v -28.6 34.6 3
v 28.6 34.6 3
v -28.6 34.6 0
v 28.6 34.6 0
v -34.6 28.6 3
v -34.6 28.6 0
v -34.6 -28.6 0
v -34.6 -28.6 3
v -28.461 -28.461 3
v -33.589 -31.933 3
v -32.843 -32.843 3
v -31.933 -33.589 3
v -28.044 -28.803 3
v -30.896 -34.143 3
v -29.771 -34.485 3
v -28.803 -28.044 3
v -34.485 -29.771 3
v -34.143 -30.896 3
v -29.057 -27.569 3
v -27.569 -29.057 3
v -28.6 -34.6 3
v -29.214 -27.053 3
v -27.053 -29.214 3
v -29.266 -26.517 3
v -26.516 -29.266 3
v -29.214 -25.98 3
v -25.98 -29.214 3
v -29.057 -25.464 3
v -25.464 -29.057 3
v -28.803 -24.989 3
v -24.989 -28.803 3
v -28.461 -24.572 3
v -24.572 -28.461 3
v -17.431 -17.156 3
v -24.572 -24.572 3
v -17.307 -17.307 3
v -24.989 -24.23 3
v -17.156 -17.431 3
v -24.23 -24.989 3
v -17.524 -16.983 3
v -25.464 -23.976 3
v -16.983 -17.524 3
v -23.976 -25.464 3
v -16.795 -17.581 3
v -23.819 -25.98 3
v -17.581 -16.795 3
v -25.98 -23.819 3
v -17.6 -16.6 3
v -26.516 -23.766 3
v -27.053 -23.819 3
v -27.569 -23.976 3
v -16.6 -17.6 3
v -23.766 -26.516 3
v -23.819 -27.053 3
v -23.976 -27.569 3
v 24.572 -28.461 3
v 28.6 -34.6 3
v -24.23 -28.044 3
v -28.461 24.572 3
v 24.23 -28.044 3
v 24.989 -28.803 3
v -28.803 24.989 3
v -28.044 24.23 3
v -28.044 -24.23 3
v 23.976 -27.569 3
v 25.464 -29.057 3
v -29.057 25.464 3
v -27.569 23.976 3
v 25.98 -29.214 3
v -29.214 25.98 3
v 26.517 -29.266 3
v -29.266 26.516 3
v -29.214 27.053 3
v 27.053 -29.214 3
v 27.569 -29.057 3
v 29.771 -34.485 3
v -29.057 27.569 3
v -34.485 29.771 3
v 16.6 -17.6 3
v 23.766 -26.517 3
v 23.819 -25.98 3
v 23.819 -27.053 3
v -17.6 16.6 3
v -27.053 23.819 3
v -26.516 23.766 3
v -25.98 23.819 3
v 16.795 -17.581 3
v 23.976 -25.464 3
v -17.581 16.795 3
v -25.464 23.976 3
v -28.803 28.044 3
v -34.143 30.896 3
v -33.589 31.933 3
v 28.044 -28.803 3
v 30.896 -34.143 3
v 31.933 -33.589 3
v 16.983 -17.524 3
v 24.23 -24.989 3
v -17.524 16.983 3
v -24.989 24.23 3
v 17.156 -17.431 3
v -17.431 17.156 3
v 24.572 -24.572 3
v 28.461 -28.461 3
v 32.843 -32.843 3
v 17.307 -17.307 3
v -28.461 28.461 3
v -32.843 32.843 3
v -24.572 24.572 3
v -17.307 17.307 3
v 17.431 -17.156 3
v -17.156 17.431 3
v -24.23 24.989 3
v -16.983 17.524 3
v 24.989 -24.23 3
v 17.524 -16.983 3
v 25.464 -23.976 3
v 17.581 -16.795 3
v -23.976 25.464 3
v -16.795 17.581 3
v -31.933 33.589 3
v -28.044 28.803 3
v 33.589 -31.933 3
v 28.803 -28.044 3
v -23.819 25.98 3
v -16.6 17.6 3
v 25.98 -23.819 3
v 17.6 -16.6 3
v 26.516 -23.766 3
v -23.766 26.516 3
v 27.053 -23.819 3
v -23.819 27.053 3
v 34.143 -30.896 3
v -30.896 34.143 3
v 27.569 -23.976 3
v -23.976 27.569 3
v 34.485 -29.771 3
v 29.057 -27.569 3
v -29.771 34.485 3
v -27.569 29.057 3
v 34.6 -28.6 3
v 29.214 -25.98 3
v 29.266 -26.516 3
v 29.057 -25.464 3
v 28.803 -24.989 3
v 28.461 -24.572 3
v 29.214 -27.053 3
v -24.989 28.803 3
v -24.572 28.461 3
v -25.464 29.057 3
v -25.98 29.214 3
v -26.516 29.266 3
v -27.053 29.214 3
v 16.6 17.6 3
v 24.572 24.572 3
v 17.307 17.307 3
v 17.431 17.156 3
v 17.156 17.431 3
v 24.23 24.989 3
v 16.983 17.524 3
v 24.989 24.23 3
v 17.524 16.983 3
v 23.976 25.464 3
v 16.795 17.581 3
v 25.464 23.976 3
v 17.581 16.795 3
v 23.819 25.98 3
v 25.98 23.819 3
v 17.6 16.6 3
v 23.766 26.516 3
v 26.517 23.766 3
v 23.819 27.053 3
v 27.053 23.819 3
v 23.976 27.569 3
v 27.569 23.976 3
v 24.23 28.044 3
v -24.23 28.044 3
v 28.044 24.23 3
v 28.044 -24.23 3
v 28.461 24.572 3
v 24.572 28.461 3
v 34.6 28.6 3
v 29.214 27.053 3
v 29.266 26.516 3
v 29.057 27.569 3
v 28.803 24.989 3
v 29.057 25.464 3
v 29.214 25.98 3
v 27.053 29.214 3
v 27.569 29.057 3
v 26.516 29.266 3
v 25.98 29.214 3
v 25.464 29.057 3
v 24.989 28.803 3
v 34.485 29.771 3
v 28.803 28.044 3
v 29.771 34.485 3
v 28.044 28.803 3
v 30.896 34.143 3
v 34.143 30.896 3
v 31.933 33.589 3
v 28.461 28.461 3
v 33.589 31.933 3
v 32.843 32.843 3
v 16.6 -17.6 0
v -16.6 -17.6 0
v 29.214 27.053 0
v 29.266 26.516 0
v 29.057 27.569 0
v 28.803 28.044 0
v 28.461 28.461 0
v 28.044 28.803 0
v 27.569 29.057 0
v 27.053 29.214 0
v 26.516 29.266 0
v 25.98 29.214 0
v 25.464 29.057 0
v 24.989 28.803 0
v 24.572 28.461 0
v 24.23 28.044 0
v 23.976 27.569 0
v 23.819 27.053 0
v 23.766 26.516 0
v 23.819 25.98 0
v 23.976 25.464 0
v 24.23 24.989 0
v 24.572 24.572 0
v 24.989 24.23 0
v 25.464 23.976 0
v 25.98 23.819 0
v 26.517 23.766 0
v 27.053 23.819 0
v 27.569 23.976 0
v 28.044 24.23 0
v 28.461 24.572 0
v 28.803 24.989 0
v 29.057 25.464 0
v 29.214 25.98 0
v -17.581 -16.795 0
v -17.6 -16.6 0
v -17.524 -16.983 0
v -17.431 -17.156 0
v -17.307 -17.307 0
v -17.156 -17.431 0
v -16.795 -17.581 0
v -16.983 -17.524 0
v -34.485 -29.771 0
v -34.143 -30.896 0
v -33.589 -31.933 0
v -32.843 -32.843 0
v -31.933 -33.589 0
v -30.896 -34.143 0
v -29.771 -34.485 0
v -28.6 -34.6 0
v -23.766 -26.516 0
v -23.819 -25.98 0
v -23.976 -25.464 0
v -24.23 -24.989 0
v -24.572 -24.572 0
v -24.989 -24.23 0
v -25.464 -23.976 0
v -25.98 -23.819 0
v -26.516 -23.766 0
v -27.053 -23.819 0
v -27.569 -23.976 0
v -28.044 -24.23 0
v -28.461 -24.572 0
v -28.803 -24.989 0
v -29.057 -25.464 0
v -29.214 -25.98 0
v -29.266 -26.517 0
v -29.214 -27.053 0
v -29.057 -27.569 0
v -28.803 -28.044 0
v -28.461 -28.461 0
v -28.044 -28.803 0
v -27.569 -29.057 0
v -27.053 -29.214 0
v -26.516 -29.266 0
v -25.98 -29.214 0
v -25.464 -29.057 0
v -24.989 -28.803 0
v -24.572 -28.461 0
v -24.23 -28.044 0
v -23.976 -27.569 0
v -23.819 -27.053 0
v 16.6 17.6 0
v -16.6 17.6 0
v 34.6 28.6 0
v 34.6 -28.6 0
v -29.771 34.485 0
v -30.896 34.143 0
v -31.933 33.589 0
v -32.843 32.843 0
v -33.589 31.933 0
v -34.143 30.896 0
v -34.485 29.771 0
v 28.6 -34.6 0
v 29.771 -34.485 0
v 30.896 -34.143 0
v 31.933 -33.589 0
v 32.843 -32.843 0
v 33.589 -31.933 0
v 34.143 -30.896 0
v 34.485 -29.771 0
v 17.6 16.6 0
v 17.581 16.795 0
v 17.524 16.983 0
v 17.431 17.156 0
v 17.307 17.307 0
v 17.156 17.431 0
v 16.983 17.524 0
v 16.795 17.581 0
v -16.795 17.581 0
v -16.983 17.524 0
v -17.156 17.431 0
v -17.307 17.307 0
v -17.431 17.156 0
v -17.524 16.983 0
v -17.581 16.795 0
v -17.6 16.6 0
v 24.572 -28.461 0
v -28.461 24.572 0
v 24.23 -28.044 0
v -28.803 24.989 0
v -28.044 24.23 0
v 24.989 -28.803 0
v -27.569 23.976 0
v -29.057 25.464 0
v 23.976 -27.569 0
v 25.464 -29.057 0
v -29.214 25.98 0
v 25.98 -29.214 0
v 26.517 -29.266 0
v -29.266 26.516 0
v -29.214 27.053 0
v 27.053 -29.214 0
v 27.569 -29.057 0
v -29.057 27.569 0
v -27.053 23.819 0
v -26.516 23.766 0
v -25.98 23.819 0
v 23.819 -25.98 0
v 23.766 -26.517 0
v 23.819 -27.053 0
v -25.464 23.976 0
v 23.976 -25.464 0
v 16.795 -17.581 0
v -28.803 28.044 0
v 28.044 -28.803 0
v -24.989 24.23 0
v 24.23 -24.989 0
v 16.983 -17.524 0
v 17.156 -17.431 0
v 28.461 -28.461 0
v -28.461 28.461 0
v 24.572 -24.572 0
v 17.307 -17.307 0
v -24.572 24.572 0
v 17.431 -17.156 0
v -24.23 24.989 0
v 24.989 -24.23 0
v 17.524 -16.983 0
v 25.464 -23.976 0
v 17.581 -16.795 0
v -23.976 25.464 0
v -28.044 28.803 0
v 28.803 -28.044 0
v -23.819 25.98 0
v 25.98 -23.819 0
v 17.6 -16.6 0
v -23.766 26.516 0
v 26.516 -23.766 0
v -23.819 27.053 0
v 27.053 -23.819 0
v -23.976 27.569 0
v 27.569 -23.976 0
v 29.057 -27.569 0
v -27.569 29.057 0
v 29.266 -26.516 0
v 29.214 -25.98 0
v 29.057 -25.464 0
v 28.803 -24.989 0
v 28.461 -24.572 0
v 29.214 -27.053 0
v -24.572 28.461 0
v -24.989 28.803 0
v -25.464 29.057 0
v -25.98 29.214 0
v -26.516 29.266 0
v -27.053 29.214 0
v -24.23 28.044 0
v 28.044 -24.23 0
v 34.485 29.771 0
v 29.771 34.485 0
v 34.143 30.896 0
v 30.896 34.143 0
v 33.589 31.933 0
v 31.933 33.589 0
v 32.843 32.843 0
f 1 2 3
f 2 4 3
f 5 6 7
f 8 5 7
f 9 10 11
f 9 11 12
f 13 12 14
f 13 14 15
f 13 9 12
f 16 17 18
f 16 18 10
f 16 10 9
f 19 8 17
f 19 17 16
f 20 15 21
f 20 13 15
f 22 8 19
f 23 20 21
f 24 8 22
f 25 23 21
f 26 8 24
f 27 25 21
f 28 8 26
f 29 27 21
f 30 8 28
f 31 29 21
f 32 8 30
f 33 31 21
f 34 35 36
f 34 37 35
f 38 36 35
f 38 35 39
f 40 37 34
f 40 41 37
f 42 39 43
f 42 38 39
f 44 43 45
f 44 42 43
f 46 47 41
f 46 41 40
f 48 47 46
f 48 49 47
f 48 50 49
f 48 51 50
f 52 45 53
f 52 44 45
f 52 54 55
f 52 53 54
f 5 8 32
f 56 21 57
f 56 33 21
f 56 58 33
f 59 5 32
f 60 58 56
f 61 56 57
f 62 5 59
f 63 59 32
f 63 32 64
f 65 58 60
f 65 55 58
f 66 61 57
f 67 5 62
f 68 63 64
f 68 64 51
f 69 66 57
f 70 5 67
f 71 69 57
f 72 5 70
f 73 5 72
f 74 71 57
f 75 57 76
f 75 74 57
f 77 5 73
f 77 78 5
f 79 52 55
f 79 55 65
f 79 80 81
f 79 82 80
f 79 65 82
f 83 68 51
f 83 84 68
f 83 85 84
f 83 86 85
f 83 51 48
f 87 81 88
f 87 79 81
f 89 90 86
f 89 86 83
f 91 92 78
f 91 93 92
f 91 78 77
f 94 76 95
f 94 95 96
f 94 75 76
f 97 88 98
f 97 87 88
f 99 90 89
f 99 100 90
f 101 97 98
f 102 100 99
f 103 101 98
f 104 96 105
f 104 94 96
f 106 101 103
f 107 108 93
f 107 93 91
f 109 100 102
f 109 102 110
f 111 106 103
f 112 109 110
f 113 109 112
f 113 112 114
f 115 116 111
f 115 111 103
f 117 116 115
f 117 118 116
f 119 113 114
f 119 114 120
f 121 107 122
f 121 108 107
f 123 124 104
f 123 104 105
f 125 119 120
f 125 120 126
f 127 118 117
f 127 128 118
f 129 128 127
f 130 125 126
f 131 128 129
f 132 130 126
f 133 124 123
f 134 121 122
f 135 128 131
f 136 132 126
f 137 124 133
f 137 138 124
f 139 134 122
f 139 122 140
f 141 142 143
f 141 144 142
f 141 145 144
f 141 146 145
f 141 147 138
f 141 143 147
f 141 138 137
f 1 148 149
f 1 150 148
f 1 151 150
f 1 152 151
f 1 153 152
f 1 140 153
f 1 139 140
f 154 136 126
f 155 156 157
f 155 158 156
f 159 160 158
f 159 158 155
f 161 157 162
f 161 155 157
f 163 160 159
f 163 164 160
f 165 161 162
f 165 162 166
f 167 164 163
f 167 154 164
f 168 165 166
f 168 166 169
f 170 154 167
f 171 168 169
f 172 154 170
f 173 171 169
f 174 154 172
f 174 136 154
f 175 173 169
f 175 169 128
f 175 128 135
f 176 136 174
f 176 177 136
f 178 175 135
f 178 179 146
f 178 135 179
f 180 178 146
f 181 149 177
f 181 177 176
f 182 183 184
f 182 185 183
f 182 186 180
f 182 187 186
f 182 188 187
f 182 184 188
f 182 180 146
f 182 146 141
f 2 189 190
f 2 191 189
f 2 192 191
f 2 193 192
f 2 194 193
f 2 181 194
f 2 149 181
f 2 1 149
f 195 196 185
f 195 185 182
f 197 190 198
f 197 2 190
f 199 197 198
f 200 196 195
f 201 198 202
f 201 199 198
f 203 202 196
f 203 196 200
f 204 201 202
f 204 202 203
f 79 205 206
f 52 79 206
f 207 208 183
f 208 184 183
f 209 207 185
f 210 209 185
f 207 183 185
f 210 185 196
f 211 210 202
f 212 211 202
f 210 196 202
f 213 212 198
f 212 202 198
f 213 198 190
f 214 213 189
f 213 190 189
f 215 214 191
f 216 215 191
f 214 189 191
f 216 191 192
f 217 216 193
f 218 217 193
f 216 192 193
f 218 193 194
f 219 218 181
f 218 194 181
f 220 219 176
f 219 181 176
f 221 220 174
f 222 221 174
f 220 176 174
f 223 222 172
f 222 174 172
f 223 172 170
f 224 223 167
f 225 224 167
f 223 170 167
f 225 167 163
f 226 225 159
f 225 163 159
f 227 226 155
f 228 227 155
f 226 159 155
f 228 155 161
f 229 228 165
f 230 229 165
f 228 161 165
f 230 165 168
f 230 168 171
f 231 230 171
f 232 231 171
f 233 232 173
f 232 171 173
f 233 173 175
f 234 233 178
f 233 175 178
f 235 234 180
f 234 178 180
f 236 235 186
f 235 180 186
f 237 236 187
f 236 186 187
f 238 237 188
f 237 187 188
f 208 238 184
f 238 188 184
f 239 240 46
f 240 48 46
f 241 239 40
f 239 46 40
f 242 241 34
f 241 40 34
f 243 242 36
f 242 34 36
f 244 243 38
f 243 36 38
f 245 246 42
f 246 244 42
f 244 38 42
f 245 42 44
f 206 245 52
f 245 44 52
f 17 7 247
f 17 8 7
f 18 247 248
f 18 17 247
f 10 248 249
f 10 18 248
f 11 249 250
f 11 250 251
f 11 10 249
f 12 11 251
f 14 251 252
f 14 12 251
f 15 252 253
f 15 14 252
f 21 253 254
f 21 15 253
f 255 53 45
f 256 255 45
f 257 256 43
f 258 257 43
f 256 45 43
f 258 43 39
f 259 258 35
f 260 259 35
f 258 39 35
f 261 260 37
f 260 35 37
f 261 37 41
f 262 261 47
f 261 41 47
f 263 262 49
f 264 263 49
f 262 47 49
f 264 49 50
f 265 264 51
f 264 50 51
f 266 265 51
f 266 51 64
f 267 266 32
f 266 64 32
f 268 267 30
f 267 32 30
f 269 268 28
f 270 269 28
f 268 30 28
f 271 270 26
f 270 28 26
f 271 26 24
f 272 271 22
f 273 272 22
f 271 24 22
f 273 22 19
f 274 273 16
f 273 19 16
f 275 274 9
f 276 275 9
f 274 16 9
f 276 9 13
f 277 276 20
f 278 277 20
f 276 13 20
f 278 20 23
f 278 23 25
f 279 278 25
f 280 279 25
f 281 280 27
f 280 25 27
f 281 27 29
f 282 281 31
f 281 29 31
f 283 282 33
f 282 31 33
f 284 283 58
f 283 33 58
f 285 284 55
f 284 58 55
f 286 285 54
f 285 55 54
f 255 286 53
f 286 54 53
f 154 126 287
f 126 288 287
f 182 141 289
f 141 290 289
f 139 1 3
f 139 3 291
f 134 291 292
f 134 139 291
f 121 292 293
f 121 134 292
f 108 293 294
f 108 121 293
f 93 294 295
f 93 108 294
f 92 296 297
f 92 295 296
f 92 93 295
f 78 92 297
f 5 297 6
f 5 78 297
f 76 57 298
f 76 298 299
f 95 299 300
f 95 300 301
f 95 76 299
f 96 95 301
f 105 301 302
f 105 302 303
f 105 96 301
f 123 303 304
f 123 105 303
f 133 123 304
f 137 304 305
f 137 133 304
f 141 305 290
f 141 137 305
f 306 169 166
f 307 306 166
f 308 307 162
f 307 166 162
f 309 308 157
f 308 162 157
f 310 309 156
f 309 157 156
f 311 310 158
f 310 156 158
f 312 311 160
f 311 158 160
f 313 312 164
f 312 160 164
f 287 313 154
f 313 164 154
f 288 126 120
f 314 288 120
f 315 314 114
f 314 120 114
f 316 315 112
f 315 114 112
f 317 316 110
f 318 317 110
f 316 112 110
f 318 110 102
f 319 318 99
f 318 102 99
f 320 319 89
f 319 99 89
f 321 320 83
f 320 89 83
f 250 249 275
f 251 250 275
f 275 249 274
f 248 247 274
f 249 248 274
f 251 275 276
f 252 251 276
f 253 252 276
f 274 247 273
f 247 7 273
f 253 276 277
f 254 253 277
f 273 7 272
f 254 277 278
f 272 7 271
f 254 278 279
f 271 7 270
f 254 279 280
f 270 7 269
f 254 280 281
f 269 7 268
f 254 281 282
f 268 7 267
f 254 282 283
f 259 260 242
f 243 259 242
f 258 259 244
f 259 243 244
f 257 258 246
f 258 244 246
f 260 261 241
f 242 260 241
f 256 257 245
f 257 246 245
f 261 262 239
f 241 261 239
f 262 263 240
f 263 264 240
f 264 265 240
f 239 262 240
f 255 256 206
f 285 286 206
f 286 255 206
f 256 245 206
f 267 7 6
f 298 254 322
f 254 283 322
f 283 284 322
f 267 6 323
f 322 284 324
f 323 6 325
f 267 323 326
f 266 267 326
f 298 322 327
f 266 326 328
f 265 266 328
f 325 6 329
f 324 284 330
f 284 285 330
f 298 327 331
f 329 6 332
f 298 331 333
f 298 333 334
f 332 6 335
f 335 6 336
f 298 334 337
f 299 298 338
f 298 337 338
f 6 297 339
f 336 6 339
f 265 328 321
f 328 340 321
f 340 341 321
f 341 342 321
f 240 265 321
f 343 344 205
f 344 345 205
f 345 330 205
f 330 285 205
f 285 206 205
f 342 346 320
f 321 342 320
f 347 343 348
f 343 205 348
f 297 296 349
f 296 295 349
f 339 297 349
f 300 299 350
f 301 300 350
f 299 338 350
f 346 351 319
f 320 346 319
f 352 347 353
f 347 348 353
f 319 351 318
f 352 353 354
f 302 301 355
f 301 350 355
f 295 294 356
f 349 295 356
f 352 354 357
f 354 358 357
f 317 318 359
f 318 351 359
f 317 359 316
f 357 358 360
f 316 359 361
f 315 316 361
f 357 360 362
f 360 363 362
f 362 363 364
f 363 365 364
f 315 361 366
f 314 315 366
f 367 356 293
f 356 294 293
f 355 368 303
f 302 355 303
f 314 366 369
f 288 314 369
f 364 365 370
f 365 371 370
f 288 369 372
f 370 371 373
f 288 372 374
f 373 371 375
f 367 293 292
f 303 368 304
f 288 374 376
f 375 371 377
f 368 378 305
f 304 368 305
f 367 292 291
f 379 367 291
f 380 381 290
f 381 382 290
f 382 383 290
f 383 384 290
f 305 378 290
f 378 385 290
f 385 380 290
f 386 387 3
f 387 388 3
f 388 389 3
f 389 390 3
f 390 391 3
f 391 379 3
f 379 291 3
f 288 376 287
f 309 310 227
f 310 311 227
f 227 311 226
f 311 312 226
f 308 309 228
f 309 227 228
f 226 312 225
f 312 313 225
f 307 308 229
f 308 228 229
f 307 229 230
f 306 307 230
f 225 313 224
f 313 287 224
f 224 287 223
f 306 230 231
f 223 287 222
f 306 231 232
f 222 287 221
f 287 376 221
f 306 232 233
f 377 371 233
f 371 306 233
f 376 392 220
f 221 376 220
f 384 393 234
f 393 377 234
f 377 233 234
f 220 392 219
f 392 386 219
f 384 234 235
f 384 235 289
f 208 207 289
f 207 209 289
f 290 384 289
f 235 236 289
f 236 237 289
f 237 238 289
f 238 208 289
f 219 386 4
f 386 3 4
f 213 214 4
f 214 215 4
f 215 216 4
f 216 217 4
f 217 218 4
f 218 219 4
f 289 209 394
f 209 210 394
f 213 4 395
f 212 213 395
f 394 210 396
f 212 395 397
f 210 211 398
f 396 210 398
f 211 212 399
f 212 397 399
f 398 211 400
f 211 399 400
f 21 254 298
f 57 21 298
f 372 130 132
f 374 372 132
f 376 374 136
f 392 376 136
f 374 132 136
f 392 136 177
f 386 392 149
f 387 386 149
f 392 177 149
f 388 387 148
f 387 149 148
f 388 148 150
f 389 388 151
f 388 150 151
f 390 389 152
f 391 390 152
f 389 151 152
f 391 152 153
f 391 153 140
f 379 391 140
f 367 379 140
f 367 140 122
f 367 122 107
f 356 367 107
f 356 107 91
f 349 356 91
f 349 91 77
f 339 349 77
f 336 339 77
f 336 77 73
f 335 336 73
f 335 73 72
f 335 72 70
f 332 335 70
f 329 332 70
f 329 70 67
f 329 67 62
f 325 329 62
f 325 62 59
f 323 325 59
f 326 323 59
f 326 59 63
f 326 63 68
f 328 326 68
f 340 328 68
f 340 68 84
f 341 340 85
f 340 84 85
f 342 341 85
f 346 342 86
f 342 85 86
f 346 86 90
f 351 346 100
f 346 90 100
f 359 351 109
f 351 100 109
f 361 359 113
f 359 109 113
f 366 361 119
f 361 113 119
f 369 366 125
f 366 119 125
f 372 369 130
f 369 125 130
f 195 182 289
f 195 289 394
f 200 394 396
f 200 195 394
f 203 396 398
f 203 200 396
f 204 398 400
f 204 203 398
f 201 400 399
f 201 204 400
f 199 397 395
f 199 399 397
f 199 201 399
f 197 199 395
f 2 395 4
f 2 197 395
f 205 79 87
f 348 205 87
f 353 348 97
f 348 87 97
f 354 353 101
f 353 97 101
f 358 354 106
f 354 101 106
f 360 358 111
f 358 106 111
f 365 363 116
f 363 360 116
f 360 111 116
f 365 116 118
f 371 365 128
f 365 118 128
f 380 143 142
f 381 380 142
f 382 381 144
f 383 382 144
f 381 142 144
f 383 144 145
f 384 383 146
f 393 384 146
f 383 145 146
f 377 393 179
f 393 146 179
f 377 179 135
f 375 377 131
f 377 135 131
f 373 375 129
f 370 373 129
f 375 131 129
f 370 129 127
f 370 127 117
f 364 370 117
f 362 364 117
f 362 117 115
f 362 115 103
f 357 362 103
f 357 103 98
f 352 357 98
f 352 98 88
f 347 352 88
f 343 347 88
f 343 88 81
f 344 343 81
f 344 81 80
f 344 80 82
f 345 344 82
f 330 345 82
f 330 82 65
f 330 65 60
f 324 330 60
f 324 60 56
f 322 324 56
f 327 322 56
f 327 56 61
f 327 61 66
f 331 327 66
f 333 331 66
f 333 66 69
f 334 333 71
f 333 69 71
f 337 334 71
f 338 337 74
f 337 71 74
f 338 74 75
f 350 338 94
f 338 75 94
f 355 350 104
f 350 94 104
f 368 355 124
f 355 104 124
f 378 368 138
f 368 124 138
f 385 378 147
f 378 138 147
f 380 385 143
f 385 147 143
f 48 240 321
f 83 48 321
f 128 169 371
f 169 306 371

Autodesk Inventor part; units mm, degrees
ref_plane "YZ Plane" through (0, 0, 0) normal (1, 0, 0) x (0, 1, 0)
ref_plane "XZ Plane" through (0, 0, 0) normal (0, 1, 0) x (-1, 0, 0)
ref_plane "XY Plane" through (0, 0, 0) normal (0, 0, 1) x (1, 0, 0)
sketch "Sketch1" plane through (0, 0, 0) normal (0, 0, 1) x (1, 0, 0)
  line L0 (-34.6, -34.6) -> (34.6, -34.6)
  line L1 (34.6, -34.6) -> (34.6, 34.6)
  line L2 (34.6, 34.6) -> (-34.6, 34.6)
  line L3 (-34.6, 34.6) -> (-34.6, -34.6)
  line L4 (-34.6, -34.6) -> (34.6, 34.6) construction
  line L5 (34.6, -34.6) -> (-34.6, 34.6) construction
  line L6 (17.6, -17.6) -> (-17.6, -17.6)
  line L7 (-17.6, -17.6) -> (-17.6, 17.6)
  line L8 (-17.6, 17.6) -> (17.6, 17.6)
  line L9 (17.6, 17.6) -> (17.6, -17.6)
  line L10 (17.6, -17.6) -> (-17.6, 17.6) construction
  line L11 (-17.6, -17.6) -> (17.6, 17.6) construction
  point P0 (0, 0)
  dimension "d172" = 35.2
  dimension "d181" = 17
  dimension "d187" = 17
extrude "Plate5" add sketch "Sketch1" along normal blind 3
sketch "Sketch9" plane through (0, 0, 3) normal (0, 0, 1) x (1, 0, 0)
  circle A0 centre (26.5165, -26.5165) radius 2.75
  line L0 (26.5165, 26.5165) -> (-26.5165, 26.5165) construction
  line L1 (-26.5165, 26.5165) -> (-26.5165, -26.5165) construction
  line L2 (-26.5165, -26.5165) -> (26.5165, -26.5165) construction
  line L3 (26.5165, -26.5165) -> (26.5165, 26.5165) construction
  line L4 (26.5165, 26.5165) -> (-26.5165, -26.5165) construction
  line L5 (-26.5165, 26.5165) -> (26.5165, -26.5165) construction
  circle A1 centre (-26.5165, -26.5165) radius 2.75
  circle A2 centre (26.5165, 26.5165) radius 2.75
  circle A3 centre (-26.5165, 26.5165) radius 2.75
  circle A4 centre (0, 0) radius 37.5 construction
  line L6 (-17.6, -17.6) -> (-17.6, 17.6) projected
  line L7 (-17.6, 17.6) -> (17.6, 17.6) projected
  line L8 (17.6, 17.6) -> (17.6, -17.6) projected
  line L9 (17.6, -17.6) -> (-17.6, -17.6) projected
  line L10 (34.6, -34.6) -> (-34.6, -34.6) projected
  line L11 (34.6, 34.6) -> (34.6, -34.6) projected
  line L12 (-34.6, 34.6) -> (34.6, 34.6) projected
  line L13 (-34.6, -34.6) -> (-34.6, 34.6) projected
  line L14 (-15, 15) -> (15, 15) construction
  line L15 (15, 15) -> (15, -15) construction
  line L16 (15, -15) -> (-15, -15) construction
  line L17 (-15, -15) -> (-15, 15) construction
  line L18 (-15, -15) -> (15, 15) construction
  dimension "d188" = 75
  dimension "d174" = 5.5
  dimension "d184" = 30
  dimension "d185" = 30
  dimension "d186" = 16.2868
extrude "Cut2" cut sketch "Sketch9" against normal blind 3 contours A0 | A1 | A2 | A3
fillet "Corner Round1" radius 6 4 edges at (34.6, 34.6, 1.5) (-34.6, 34.6, 1.5) (-34.6, -34.6, 1.5) (34.6, -34.6, 1.5)
fillet "Corner Round2" radius 1 4 edges at (-17.6, 17.6, 1.5) (-17.6, -17.6, 1.5) (17.6, -17.6, 1.5) (17.6, 17.6, 1.5)
properties part number "ANP 1425 FDS Way FLANGE" material "Stainless Steel"
